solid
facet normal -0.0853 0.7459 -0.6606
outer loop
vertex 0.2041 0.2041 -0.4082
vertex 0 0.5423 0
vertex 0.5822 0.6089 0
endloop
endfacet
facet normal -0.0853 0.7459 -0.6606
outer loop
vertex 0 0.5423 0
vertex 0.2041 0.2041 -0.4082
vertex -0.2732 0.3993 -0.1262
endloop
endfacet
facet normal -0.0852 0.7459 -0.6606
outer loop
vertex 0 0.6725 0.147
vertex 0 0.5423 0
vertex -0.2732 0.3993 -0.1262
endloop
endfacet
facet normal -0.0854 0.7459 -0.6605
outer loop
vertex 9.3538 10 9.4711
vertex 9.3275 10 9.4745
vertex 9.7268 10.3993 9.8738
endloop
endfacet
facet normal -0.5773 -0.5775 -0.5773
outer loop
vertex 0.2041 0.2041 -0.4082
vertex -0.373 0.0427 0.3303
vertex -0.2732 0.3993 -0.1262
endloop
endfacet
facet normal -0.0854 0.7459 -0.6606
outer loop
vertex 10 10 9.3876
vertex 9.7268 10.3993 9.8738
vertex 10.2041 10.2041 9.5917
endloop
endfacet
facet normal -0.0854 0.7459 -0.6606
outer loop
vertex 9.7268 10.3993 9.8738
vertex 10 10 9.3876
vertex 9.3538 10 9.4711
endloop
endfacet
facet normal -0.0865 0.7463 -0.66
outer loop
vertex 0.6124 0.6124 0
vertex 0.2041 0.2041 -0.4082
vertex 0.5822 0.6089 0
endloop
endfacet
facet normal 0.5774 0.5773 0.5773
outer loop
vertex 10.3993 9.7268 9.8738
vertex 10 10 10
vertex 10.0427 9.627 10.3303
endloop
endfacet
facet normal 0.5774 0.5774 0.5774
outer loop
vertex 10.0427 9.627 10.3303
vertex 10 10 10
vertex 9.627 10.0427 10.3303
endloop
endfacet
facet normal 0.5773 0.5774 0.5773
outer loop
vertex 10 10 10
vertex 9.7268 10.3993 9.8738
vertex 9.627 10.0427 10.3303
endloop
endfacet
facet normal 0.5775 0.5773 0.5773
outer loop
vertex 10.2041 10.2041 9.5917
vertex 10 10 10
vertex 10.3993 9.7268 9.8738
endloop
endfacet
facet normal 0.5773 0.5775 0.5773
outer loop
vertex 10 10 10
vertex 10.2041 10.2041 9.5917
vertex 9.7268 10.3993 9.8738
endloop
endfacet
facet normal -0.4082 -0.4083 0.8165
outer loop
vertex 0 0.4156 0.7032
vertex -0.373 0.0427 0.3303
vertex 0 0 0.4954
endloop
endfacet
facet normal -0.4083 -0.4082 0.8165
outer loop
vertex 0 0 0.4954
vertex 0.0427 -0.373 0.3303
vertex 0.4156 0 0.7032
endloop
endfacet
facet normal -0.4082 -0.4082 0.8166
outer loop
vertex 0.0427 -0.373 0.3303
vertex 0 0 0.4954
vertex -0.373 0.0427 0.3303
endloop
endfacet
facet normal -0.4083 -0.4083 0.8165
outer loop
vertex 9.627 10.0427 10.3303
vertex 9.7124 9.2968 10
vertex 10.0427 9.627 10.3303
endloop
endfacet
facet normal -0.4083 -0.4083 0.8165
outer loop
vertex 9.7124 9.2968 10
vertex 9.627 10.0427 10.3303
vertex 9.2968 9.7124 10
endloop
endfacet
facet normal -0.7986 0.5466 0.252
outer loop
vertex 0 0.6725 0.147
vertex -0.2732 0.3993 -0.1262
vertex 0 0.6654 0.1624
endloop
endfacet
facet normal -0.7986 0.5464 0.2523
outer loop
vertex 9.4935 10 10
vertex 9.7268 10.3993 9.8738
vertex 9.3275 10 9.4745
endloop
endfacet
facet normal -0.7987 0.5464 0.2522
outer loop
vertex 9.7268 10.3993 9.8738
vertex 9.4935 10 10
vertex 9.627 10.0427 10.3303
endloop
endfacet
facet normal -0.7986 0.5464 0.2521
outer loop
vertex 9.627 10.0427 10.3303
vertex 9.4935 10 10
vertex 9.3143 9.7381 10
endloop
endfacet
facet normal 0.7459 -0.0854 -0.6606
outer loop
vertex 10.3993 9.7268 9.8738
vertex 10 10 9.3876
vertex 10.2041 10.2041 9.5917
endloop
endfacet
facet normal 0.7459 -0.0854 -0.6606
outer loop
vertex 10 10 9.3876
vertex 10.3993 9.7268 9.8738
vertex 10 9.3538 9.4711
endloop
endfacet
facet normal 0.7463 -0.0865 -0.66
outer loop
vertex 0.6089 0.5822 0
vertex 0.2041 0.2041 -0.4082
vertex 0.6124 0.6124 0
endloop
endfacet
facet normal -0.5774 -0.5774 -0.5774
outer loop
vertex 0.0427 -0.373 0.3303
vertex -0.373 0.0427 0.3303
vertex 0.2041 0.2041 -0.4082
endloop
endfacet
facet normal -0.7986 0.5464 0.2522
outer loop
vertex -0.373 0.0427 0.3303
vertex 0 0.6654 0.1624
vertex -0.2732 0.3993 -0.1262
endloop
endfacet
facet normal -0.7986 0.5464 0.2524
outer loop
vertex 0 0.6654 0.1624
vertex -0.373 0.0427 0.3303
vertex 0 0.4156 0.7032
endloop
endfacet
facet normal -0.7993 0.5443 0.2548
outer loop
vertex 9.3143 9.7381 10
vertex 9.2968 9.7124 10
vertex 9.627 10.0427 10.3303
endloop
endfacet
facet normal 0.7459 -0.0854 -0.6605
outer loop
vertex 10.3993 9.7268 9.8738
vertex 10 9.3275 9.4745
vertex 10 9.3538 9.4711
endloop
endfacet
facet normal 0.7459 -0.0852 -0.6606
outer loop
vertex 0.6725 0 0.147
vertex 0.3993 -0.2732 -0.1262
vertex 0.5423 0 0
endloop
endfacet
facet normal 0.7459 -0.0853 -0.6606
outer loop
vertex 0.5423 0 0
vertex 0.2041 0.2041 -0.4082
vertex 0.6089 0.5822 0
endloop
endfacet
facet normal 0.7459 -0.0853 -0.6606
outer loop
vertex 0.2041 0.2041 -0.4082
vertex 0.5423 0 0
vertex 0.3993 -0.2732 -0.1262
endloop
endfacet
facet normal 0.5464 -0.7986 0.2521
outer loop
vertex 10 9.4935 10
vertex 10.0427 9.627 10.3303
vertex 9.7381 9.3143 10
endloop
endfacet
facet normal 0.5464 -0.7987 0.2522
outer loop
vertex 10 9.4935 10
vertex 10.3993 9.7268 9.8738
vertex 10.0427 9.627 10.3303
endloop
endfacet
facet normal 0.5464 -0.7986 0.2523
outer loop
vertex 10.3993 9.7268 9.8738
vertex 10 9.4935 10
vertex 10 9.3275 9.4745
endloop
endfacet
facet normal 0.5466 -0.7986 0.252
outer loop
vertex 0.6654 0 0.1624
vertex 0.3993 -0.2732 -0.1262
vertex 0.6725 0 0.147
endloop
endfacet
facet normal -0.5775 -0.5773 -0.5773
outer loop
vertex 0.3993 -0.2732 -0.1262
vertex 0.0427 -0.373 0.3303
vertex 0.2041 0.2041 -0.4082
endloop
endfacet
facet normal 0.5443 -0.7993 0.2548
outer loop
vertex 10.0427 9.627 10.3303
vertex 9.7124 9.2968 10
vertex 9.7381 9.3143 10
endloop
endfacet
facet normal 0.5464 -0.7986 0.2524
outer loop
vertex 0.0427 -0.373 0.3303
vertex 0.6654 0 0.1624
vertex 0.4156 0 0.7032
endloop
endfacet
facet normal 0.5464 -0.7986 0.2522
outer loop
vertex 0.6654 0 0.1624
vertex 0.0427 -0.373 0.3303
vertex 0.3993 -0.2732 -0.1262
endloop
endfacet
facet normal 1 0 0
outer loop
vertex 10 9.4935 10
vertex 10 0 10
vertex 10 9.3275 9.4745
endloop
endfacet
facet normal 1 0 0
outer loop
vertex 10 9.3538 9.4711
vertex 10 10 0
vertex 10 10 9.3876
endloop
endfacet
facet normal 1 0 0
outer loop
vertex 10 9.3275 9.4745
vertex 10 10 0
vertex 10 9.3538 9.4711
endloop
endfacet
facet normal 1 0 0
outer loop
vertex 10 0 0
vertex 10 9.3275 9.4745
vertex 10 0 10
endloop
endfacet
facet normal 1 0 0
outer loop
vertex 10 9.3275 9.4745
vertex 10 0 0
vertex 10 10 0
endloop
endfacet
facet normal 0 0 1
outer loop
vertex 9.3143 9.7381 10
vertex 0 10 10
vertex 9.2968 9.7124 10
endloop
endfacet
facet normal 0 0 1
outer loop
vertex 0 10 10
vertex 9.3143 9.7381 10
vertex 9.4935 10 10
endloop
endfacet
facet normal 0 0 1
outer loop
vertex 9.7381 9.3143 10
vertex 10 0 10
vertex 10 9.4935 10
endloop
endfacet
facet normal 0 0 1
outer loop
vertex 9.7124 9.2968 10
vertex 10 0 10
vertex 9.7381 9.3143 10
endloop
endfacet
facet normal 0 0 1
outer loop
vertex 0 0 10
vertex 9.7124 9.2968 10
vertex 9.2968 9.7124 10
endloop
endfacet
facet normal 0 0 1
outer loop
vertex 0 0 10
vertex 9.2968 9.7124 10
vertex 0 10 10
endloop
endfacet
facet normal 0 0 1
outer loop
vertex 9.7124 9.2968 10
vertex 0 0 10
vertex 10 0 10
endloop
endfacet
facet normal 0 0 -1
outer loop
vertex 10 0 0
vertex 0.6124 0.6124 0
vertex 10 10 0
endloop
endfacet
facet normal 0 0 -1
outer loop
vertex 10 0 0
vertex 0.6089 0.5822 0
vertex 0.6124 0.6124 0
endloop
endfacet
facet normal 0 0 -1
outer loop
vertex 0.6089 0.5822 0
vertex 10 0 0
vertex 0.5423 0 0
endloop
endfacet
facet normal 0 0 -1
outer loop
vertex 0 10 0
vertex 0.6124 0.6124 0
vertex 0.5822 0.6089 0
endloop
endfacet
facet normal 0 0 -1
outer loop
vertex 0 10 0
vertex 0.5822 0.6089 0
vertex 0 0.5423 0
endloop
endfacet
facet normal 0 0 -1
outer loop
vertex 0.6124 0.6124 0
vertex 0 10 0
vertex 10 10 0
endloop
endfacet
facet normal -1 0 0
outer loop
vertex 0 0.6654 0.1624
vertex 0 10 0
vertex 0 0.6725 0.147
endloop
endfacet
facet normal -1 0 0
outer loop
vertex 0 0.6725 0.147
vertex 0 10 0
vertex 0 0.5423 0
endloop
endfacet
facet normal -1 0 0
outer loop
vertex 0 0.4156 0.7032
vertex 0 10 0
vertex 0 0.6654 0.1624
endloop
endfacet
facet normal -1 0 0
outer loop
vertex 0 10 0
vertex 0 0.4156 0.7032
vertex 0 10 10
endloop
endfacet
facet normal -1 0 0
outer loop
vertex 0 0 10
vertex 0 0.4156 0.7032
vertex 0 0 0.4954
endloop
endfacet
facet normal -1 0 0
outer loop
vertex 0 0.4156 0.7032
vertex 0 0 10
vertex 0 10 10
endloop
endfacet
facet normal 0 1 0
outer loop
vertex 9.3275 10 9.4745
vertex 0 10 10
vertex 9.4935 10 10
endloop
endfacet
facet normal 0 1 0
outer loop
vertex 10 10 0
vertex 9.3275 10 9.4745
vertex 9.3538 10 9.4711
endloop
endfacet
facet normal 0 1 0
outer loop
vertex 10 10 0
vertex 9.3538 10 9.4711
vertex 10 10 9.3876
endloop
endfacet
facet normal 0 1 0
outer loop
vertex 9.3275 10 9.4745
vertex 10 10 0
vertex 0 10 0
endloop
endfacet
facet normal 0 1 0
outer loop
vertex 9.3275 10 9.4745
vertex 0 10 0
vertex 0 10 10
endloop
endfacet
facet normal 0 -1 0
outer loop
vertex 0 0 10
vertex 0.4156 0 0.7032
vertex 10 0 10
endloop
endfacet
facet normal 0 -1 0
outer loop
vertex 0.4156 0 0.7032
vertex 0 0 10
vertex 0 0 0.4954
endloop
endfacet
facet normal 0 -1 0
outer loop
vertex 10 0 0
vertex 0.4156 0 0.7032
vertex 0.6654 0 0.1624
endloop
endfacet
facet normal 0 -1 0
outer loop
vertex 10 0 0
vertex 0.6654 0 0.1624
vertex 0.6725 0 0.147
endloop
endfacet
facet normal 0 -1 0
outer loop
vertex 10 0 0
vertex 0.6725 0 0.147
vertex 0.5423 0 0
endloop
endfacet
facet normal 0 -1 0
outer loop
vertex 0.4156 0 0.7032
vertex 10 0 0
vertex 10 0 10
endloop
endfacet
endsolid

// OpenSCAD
// Unit of length: Unit.MM
union()
{
   rotate(a = [0.0, 54.7356, 45.0])
   {
      cylinder(h = 17.3205, r = 0.5, center = false);
   }
   color(c = [0.502, 0.502, 0.502, 0.5])
   {
      cube(size = 10.0, center = false);
   }
}
